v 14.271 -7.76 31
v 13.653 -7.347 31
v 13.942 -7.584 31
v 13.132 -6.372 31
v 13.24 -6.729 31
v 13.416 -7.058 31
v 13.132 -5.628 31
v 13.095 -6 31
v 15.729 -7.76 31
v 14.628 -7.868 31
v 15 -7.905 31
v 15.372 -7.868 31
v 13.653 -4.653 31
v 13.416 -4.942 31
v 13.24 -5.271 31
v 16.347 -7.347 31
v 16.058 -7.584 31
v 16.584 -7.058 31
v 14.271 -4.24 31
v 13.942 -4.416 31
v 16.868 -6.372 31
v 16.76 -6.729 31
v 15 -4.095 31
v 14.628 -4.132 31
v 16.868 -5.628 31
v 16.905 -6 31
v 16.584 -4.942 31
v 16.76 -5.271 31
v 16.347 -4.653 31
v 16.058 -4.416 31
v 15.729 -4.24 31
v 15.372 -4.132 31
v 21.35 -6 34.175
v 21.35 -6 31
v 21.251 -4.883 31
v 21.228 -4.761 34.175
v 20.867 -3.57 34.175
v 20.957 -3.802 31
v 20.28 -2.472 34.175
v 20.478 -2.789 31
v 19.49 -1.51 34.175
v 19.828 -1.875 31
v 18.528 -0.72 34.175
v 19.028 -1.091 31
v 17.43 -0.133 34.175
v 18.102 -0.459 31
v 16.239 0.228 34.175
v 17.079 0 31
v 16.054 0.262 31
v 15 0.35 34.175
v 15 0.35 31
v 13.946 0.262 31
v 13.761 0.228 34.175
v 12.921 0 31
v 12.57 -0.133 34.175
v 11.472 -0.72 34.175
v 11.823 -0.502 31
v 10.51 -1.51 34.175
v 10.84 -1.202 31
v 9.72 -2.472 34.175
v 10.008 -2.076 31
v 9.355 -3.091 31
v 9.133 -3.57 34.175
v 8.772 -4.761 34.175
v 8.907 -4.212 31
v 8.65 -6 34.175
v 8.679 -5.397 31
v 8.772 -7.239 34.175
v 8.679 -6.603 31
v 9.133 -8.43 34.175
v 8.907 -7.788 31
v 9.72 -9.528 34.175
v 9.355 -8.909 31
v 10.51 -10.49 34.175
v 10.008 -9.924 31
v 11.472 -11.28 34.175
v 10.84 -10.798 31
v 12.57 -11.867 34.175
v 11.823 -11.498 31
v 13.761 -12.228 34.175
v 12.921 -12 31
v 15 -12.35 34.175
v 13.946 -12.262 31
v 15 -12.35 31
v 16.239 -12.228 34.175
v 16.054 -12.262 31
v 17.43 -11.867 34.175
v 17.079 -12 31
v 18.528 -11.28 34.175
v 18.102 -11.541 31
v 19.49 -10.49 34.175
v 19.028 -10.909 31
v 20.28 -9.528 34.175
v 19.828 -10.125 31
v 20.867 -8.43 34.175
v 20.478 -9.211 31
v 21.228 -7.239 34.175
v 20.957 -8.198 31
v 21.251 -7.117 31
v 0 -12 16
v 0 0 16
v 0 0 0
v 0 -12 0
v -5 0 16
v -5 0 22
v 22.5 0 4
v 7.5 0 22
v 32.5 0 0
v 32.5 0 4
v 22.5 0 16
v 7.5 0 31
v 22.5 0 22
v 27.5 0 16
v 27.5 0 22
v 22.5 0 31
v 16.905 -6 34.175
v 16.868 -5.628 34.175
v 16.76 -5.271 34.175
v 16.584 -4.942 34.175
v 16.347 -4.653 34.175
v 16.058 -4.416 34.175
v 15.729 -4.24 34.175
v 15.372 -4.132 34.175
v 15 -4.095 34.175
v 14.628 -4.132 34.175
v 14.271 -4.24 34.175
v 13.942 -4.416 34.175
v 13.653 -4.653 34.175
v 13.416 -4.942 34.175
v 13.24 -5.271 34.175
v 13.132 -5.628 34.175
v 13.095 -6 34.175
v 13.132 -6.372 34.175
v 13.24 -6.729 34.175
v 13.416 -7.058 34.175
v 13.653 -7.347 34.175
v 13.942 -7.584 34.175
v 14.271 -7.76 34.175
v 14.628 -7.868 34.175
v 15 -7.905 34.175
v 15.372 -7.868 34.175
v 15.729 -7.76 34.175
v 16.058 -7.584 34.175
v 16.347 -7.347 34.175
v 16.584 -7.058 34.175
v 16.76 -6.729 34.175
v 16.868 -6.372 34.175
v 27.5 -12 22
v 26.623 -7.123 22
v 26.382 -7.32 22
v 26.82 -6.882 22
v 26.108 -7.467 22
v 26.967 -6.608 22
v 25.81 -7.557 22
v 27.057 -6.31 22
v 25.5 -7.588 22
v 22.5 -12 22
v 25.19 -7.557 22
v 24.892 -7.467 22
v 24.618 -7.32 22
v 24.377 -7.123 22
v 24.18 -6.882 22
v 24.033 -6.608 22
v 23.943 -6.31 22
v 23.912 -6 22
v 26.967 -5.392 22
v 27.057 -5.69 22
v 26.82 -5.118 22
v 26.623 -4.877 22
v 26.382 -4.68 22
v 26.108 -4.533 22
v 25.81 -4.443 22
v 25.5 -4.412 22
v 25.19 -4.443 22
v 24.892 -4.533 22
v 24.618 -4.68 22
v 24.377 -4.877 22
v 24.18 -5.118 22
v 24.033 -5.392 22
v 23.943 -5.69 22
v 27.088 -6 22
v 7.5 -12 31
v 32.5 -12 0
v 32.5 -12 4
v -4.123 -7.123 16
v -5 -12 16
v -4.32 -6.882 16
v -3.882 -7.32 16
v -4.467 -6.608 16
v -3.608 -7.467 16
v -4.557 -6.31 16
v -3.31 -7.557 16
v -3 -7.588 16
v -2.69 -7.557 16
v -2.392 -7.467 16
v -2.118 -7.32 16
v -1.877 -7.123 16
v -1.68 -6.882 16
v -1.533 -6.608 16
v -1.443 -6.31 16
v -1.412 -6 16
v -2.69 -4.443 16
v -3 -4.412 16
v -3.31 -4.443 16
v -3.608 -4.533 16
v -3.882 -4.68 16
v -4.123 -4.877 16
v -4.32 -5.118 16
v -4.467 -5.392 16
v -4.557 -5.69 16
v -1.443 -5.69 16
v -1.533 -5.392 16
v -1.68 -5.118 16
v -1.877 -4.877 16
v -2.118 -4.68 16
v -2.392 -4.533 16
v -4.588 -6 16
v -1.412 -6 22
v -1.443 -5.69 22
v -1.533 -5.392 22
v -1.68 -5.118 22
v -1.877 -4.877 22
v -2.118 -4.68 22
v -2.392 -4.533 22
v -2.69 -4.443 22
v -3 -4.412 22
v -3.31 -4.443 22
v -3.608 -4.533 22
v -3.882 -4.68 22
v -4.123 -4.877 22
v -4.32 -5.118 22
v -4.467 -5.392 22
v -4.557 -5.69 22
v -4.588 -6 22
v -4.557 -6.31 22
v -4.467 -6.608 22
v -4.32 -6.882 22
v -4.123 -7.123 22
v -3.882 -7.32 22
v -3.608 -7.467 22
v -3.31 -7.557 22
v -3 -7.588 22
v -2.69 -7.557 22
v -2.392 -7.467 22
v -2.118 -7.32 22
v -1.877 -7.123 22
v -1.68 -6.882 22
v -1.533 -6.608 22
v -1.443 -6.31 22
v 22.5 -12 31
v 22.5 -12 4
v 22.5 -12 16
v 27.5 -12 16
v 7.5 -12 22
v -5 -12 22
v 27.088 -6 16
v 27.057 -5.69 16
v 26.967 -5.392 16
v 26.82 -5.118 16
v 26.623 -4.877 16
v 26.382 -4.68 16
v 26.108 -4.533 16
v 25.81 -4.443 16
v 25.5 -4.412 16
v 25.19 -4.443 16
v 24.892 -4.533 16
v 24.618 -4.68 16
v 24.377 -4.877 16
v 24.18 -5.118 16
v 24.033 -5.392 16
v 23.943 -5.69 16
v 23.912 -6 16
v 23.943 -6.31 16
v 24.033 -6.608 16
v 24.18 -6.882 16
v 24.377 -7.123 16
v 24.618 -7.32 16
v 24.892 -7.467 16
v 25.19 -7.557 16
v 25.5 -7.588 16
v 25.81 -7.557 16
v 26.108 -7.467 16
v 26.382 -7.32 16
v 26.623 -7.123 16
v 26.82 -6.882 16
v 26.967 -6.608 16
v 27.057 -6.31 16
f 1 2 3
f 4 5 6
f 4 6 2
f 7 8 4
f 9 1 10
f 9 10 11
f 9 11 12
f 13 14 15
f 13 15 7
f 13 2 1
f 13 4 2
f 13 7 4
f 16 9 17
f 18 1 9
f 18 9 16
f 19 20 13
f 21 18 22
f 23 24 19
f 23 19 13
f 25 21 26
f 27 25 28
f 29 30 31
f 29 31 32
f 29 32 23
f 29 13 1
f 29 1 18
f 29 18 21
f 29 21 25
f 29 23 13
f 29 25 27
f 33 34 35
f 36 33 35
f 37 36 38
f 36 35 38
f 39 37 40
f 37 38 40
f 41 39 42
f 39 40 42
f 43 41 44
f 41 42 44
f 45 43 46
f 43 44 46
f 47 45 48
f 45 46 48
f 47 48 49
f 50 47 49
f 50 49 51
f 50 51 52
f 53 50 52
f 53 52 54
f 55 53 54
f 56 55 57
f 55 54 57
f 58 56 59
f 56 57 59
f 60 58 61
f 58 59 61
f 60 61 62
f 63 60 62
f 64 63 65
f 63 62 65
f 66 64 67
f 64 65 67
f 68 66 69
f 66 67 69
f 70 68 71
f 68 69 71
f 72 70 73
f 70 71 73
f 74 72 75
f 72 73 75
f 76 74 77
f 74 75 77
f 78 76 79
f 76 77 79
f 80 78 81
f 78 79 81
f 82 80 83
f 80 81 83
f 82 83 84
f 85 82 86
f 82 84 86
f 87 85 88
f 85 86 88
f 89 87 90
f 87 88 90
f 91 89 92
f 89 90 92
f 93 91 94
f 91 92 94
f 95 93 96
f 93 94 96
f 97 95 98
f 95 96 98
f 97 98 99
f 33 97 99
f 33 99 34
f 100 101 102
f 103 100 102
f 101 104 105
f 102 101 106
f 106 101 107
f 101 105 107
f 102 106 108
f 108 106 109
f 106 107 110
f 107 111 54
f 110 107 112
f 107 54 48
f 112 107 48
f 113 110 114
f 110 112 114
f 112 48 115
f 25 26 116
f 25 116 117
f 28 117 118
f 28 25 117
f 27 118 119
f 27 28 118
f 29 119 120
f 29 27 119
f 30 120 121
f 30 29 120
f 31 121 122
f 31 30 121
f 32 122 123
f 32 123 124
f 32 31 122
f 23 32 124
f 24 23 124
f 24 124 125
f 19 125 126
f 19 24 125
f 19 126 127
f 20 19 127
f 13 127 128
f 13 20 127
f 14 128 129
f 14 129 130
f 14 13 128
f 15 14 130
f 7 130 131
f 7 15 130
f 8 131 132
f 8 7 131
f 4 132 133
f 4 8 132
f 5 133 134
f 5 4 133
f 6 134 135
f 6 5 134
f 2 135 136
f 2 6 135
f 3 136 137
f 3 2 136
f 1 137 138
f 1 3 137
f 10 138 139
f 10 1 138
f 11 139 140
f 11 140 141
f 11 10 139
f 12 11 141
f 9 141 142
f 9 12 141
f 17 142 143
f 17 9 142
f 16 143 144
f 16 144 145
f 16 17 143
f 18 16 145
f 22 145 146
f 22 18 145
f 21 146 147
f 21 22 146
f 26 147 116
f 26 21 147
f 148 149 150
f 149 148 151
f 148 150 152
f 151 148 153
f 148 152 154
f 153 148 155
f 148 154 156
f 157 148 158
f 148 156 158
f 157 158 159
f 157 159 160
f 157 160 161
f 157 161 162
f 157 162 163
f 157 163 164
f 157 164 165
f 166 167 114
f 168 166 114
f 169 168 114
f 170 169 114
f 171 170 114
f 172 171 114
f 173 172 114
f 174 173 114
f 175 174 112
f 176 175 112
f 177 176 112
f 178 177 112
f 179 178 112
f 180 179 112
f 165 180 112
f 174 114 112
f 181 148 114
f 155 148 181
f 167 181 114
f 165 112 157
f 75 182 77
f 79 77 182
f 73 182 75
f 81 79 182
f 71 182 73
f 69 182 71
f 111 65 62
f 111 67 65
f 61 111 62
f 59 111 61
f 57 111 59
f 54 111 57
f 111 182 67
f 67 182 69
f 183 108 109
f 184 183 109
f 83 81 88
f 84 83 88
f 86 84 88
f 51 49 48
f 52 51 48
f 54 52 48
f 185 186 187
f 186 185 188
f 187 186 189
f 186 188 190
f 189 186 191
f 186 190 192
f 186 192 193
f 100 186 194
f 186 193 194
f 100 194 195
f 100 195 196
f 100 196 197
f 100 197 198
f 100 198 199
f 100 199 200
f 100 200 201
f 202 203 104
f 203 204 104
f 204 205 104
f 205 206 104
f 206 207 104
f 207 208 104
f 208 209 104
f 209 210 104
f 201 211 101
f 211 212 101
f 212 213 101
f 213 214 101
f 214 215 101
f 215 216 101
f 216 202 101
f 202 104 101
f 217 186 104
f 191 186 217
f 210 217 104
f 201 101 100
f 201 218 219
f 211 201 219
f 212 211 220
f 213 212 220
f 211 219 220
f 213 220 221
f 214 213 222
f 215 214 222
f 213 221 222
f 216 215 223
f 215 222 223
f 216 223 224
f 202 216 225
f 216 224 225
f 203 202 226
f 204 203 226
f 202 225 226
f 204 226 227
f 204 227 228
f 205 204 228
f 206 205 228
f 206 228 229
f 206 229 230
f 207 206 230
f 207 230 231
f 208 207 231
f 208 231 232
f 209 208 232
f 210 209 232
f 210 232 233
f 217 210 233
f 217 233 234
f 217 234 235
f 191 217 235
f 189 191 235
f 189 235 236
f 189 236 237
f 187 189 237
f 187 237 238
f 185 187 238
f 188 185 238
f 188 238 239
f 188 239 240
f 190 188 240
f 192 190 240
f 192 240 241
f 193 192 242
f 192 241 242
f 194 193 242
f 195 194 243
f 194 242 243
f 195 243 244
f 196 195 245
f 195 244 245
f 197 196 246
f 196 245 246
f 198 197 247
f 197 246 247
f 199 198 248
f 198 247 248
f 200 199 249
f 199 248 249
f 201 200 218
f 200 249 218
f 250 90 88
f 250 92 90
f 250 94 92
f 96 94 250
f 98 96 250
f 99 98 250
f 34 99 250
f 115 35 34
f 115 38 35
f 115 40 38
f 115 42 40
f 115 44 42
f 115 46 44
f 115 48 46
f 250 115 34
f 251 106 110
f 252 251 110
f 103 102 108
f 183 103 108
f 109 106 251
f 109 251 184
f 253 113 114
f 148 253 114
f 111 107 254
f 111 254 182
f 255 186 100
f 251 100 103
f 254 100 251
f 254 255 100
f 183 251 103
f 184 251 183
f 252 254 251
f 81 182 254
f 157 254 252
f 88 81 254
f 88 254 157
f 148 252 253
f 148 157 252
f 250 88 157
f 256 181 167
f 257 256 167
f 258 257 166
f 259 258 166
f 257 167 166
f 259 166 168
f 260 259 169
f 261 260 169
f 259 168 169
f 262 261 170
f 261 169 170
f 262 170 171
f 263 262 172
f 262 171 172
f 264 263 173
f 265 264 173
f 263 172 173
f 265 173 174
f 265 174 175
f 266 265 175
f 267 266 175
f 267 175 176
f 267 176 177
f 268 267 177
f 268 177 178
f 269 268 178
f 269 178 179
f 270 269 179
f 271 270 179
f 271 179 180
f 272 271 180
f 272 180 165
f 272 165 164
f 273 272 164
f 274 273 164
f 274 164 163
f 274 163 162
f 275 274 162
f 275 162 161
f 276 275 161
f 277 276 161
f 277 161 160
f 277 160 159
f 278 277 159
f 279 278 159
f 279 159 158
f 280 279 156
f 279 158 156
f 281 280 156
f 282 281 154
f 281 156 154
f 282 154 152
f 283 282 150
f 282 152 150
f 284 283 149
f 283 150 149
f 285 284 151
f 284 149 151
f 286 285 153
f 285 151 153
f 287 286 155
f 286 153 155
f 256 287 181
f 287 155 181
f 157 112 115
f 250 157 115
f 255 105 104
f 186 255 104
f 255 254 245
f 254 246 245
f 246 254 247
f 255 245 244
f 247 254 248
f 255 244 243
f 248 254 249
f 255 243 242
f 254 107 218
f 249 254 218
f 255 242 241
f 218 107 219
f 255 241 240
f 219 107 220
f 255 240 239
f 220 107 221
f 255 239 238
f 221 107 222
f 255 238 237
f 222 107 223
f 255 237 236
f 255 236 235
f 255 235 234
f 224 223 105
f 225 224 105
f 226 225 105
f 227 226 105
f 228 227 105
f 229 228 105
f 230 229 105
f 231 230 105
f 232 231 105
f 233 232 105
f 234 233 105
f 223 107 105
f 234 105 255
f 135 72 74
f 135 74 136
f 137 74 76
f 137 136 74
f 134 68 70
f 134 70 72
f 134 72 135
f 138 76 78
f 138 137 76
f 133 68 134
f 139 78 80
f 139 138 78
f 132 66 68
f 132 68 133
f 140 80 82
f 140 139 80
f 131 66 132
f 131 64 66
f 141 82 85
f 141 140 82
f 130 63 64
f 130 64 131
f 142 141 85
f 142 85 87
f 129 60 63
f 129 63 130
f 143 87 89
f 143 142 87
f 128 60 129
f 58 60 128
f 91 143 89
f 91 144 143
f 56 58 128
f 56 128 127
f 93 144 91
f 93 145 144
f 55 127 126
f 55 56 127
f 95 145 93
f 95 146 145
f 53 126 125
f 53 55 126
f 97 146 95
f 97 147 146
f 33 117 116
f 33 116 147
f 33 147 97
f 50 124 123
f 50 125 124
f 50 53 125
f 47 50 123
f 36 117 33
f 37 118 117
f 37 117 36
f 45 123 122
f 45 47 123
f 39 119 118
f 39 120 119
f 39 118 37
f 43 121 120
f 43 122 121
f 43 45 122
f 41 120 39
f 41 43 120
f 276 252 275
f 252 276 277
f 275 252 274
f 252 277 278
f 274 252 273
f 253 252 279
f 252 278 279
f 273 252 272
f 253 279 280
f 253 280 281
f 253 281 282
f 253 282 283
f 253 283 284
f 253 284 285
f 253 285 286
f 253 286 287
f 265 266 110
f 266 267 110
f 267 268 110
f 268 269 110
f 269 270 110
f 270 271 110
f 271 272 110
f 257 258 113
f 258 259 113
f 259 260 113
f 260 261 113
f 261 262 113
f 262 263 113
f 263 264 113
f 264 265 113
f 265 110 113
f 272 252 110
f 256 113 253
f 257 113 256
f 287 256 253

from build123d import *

# Parameters (mm, degrees)
F0_W     = 10
F0_H     = 4
F0_W_2   = 15
F0_H_2   = 9
F1_DEPTH = 12
F2_R     = 1.5875
F3_DEPTH = 10
F4_R     = 6.35
F4_R_2   = 1.905
F5_DEPTH = 3.175


with BuildPart() as f1:
    # F0 (on Front) → F1 (new body)
    with BuildSketch(Plane.XZ):
        Polygon((0, 16), (0, 0), (22.5, 0), (22.5, 4), (22.5, 16), align=None)
        with Locations((27.5, 2)):
            Rectangle(F0_W, F0_H)
        Polygon((-5, 16), (0, 16), (22.5, 16), (27.5, 16), (27.5, 22), (22.5, 22), (7.5, 22), (-5, 22), align=None)
        with Locations((15, 26.5)):
            Rectangle(F0_W_2, F0_H_2)
    extrude(amount=F1_DEPTH)

    # F2 (on face) → F3 (cut)
    with BuildSketch(Plane.XY.offset(22)):
        with Locations((-3, -6)):
            Circle(F2_R)
        with Locations((25.5, -6)):
            Circle(F2_R)
    extrude(amount=-F3_DEPTH, mode=Mode.SUBTRACT)

    # F4 (on face) → F5 (join)
    with BuildSketch(Plane.XY.offset(31)):
        with Locations((15, -6)):
            Circle(F4_R)
        with Locations((15, -6)):
            Circle(F4_R_2, mode=Mode.SUBTRACT)
    extrude(amount=F5_DEPTH)


solid = f1.part
